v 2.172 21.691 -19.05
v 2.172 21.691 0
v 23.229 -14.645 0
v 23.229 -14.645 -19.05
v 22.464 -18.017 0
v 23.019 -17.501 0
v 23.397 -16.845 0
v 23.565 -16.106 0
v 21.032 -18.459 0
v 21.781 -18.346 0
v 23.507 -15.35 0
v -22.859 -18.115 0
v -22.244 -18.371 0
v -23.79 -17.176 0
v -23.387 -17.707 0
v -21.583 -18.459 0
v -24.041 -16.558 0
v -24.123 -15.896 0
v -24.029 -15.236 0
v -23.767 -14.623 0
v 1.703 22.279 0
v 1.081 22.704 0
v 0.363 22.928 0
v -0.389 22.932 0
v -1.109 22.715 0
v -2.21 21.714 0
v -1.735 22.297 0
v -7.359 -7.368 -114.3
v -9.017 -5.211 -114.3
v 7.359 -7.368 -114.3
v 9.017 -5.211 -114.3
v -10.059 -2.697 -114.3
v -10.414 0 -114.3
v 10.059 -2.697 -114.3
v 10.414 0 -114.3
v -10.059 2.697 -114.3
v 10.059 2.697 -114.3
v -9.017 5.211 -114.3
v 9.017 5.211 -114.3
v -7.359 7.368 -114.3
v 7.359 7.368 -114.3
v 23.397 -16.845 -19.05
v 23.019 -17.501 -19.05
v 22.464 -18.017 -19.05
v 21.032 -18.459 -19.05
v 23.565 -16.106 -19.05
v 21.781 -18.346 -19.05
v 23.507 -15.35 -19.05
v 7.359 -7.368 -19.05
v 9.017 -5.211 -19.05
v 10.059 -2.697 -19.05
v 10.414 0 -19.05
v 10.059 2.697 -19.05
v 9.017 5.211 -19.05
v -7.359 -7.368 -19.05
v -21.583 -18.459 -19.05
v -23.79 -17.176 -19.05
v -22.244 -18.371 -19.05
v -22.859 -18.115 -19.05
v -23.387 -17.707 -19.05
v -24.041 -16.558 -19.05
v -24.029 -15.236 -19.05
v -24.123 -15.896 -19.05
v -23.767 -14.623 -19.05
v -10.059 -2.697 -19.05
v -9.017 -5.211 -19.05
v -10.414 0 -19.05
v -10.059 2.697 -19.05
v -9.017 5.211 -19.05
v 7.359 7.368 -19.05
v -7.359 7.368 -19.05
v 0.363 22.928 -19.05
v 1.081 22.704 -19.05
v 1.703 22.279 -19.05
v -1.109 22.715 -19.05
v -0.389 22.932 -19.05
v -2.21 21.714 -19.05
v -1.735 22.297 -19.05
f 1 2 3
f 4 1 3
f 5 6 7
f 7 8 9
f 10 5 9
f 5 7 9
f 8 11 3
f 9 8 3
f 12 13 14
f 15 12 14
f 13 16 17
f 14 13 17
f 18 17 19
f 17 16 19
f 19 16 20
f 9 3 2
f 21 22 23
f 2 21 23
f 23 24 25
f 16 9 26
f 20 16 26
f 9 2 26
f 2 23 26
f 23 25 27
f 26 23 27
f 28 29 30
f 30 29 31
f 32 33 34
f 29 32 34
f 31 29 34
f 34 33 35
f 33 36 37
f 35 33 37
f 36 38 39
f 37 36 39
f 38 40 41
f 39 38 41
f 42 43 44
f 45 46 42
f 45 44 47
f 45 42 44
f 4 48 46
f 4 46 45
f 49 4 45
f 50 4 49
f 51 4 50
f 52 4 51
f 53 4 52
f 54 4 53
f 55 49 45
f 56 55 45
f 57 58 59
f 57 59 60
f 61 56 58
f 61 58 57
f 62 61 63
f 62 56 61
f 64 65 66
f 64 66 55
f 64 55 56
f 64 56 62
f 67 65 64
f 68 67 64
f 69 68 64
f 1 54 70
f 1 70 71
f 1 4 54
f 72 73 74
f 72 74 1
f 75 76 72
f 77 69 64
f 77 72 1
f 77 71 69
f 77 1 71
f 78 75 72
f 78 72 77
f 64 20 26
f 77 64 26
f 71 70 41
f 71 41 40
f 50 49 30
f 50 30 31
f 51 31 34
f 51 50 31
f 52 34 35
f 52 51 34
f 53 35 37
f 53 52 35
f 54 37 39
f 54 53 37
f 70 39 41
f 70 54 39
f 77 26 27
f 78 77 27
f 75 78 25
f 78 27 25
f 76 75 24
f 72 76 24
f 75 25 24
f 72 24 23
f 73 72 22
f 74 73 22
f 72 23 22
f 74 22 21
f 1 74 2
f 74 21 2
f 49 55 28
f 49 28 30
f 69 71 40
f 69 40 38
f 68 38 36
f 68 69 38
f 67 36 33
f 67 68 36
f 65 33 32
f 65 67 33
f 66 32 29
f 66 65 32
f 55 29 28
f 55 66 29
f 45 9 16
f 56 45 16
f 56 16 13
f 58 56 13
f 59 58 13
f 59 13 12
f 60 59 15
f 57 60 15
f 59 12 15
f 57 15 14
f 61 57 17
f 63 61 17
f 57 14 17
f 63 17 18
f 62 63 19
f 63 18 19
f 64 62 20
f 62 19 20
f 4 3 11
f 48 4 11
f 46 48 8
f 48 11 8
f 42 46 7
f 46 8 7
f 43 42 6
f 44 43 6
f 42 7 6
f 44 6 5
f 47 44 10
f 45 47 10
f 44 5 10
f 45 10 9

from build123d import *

# Parameters (mm, degrees)
BOSS_EXTRUDE1_DEPTH = 114.3
BOSS_EXTRUDE2_DEPTH = 19.05


with BuildPart() as part:
    # Sketch1 → Boss-Extrude1 (new body)
    with BuildSketch(Plane.XY):
        with BuildLine():
            Line((-7.359452383, -7.368165079), (7.359452383, -7.368165079))
            ThreePointArc((7.359452383, -7.368165079), (10.414, 0), (7.359452383, 7.368165079))
            Line((7.359452383, 7.368165079), (-7.359452383, 7.368165079))
            ThreePointArc((-7.359452383, 7.368165079), (-10.414, 0), (-7.359452383, -7.368165079))
        make_face()
    extrude(amount=-BOSS_EXTRUDE1_DEPTH)

    # Sketch2 → Boss-Extrude2 (add)
    with BuildSketch(Plane.XY):
        with BuildLine():
            Line((2.171966529, 21.691427715), (23.229399553, -14.6453605))
            ThreePointArc((23.229399553, -14.6453605), (23.232480647, -17.187136052), (21.031750526, -18.458914093))
            Line((21.031750526, -18.458914093), (-21.582602225, -18.458914093))
            ThreePointArc((-21.582602225, -18.458914093), (-23.789789798, -17.175863979), (-23.767109444, -14.622947964))
            Line((-23.767109444, -14.622947964), (-2.210189717, 21.713840251))
            ThreePointArc((-2.210189717, 21.713840251), (-0.012691839, 22.957840901), (2.171966529, 21.691427715))
        make_face()
    extrude(amount=-BOSS_EXTRUDE2_DEPTH)


solid = part.part
